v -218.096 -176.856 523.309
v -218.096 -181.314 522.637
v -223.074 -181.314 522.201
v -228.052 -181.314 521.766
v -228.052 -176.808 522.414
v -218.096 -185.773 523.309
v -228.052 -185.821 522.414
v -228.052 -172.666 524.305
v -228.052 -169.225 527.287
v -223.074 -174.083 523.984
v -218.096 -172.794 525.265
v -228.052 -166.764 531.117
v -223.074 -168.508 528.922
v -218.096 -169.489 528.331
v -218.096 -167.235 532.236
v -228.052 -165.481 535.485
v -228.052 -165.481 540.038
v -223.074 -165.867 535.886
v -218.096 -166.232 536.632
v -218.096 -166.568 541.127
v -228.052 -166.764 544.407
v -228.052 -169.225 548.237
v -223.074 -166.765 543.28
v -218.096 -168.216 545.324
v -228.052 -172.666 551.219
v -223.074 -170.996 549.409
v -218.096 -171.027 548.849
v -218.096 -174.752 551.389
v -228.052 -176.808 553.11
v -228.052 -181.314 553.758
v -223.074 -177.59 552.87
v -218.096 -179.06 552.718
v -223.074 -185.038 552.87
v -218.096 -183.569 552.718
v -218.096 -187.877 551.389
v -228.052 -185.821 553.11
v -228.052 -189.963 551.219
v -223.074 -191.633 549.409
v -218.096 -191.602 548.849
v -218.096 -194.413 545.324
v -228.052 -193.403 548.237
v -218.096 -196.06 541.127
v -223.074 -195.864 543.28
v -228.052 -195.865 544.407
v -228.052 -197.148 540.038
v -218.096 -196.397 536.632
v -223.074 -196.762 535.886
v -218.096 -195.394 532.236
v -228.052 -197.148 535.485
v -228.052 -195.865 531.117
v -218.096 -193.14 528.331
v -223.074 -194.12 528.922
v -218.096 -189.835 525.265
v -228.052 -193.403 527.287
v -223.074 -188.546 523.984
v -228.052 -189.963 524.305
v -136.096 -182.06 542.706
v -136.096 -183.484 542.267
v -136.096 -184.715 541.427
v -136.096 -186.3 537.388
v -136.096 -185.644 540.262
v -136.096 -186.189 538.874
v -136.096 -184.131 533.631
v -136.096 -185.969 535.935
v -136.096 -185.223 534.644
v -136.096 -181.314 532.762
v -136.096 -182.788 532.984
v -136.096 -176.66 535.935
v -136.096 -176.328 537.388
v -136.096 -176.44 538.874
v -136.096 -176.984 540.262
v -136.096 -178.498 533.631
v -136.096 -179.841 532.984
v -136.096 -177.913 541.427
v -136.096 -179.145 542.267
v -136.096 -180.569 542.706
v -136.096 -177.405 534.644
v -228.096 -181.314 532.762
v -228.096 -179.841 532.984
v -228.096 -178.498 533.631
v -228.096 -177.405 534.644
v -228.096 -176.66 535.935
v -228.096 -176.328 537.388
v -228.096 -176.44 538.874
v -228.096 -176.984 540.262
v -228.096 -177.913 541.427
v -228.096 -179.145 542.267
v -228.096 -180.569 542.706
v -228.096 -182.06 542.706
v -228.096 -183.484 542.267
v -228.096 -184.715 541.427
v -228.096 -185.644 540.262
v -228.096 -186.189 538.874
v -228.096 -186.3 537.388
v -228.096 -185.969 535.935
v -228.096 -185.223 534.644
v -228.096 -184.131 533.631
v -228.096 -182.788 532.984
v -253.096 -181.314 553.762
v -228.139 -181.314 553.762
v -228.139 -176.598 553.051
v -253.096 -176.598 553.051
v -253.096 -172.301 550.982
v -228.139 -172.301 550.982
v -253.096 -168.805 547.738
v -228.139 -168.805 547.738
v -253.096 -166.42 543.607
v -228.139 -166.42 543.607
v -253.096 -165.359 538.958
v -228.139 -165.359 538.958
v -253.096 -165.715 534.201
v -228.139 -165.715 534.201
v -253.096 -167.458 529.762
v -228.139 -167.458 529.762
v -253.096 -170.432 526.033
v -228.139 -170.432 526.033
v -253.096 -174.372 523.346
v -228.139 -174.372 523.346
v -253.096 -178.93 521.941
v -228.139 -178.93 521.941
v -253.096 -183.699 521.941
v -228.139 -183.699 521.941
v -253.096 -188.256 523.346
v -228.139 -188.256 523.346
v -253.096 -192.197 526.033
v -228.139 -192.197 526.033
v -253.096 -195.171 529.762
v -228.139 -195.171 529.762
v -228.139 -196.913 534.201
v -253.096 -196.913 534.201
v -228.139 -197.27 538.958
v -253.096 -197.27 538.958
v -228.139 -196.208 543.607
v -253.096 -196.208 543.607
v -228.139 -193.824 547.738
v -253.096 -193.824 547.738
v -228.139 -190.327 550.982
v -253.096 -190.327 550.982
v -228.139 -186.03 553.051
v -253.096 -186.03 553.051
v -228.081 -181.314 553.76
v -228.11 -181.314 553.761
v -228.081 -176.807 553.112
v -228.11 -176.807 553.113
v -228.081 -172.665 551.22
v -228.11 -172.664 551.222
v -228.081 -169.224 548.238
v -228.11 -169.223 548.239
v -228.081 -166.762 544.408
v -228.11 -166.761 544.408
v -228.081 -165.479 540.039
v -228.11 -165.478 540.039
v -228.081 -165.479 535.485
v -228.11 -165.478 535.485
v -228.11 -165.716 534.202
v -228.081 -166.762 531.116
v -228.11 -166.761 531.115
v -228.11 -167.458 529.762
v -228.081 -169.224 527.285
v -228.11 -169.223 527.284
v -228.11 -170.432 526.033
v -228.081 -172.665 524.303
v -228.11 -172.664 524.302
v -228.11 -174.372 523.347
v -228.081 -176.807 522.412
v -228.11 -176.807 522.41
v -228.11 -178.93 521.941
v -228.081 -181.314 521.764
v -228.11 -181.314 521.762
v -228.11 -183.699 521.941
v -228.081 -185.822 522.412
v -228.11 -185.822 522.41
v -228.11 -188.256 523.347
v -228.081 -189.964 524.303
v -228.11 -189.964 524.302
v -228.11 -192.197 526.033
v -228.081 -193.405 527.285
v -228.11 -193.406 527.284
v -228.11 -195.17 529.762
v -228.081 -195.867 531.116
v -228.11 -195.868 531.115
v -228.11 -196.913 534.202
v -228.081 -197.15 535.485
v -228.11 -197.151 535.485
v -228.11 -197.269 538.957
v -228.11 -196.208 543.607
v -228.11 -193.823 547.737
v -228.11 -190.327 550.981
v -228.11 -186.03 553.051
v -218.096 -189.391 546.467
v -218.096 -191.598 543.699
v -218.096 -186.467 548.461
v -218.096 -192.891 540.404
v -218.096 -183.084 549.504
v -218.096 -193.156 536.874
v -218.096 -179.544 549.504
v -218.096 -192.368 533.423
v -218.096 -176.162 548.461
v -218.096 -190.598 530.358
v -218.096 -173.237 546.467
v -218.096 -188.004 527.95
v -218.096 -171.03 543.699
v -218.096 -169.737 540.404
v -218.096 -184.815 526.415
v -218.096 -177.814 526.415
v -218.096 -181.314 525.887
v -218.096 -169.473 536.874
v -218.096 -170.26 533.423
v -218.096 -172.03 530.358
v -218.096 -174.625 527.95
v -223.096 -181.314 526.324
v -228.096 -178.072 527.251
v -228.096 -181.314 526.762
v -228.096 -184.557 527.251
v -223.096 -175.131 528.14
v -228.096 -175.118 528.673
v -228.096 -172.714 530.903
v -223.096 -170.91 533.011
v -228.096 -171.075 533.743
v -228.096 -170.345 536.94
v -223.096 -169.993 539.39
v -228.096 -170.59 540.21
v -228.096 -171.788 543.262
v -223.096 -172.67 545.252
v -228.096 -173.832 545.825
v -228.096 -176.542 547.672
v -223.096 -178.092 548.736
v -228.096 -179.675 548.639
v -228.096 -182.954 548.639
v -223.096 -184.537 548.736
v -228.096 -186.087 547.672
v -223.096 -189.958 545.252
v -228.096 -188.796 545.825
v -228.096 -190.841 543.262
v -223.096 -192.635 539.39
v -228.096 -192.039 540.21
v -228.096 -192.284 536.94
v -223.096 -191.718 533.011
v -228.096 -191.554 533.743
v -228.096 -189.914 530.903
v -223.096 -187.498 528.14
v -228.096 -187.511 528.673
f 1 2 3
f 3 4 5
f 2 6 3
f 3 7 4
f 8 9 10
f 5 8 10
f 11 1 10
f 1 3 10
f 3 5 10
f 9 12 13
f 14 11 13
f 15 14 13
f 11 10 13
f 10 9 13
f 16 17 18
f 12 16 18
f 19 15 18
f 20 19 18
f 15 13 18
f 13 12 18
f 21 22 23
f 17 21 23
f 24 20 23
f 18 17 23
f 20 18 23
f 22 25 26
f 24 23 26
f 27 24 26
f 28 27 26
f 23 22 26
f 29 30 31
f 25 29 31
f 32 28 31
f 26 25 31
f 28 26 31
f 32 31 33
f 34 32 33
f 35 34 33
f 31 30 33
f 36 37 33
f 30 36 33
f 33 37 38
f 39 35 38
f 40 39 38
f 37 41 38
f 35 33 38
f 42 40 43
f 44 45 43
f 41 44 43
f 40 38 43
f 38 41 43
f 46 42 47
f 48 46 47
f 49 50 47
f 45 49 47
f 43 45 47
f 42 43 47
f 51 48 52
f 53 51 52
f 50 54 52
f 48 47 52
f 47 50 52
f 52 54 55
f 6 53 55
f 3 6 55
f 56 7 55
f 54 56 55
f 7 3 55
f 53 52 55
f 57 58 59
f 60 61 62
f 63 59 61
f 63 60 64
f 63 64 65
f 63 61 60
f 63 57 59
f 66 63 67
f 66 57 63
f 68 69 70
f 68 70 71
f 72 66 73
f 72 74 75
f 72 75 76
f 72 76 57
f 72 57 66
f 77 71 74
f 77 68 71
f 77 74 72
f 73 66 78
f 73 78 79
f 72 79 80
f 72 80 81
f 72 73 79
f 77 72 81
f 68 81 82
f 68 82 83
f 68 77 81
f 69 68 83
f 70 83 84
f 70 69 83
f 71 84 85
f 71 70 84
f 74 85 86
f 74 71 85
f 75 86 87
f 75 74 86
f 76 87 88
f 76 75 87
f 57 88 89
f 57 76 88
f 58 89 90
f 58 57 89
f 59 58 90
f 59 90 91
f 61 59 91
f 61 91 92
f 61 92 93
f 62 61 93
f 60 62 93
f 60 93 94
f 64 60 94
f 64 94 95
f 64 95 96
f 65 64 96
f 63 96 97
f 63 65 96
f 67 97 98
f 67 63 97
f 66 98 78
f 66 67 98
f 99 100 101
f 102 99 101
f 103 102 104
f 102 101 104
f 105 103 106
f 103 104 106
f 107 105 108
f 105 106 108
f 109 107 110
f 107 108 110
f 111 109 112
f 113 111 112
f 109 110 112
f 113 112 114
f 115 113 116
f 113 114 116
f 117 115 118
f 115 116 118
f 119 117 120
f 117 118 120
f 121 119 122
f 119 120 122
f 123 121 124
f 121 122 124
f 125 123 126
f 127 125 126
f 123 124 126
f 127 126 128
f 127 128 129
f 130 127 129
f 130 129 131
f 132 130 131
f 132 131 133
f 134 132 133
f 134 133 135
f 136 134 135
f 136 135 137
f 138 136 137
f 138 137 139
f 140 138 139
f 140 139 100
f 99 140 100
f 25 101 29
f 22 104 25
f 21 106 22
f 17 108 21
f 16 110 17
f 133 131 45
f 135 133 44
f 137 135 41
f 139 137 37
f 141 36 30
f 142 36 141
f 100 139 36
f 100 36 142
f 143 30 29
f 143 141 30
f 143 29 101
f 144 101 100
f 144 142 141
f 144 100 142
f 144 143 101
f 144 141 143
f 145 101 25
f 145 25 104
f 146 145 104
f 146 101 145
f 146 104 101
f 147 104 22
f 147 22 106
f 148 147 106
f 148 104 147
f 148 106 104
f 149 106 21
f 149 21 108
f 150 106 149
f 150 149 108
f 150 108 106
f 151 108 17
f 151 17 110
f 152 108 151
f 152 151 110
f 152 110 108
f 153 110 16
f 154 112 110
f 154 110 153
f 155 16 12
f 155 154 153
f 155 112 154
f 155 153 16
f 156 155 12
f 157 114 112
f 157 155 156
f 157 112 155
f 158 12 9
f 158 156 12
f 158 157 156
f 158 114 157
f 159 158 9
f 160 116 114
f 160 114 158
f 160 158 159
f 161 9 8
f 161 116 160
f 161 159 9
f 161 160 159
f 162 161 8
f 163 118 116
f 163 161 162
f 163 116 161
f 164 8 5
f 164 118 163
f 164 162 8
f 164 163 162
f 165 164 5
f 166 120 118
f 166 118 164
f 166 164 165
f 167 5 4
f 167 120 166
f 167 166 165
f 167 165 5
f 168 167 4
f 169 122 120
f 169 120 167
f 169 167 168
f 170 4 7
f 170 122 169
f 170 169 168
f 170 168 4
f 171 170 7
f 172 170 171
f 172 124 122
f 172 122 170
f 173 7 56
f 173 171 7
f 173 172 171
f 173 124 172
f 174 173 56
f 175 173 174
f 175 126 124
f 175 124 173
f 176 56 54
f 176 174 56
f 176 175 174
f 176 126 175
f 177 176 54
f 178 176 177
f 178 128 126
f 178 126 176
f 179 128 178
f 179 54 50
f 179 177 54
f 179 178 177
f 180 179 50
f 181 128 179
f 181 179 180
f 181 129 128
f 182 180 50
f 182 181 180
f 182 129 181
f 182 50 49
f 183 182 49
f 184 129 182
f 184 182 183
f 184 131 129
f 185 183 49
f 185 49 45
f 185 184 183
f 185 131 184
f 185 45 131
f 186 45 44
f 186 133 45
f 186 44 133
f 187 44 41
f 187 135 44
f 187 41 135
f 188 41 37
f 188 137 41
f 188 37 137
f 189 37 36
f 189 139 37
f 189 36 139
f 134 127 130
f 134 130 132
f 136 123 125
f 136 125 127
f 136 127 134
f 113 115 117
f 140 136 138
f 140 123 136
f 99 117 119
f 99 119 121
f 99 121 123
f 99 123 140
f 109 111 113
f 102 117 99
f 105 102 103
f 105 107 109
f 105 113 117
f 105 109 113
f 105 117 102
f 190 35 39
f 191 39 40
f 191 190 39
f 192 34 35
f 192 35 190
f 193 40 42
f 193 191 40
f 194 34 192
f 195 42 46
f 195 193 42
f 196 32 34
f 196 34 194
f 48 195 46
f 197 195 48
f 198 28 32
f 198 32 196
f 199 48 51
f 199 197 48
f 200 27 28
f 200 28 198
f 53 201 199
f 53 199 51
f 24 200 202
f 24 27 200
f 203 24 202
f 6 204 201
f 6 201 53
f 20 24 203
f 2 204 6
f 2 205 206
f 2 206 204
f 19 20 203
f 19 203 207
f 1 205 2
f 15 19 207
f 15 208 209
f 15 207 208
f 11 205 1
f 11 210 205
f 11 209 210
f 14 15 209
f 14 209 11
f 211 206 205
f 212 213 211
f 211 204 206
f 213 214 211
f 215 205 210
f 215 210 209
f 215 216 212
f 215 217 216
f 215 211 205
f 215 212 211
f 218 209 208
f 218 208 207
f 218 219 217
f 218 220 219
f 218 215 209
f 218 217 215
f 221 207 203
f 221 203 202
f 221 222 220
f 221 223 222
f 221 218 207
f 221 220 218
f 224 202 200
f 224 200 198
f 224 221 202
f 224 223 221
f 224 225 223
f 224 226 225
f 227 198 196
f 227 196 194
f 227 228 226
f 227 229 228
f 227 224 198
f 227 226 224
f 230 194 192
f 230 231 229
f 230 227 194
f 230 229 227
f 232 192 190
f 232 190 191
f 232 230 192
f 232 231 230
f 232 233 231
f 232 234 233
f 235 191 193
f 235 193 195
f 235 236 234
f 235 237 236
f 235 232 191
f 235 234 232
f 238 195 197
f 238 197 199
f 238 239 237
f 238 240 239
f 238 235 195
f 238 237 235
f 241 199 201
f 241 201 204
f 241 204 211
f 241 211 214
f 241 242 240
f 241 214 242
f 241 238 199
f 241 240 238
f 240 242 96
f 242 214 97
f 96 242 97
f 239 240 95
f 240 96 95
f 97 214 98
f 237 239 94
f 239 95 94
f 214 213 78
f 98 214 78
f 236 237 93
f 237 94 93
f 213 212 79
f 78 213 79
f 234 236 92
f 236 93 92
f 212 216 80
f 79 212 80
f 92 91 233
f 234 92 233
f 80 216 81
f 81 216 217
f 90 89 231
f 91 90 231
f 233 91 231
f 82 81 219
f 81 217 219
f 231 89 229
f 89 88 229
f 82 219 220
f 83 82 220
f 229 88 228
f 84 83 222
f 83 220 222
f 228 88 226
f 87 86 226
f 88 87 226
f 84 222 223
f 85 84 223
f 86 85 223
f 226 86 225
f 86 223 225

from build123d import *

# Parameters (mm, degrees)
SKETCH_2_R      = 5
EXTRUDE_1_DEPTH = 92
SKETCH_3_R      = 16
EXTRUDE_2_DEPTH = 25
SKETCH_4_R      = 16
SKETCH_4_R_2    = 11
EXTRUDE_3_DEPTH = 10
EXTRUDE_3_DRAFT = 5
FILLET_1_R      = 1


with BuildPart() as part:
    # 草图2 → 凸台-拉伸1 (new body)
    with BuildSketch(Plane(origin=(-136.095806698, 0, 0), x_dir=(0, 0, -1), z_dir=(1, 0, 0))):
        with Locations((-537.761833513, -181.314321461)):
            Circle(SKETCH_2_R)
    extrude(amount=-EXTRUDE_1_DEPTH)

    # 草图3 → 凸台-拉伸2 (add)
    with BuildSketch(Plane.ZY.offset(228.095806698)):
        with Locations((537.761833513, -181.314321461)):
            Circle(SKETCH_3_R)
    extrude(amount=EXTRUDE_2_DEPTH)


with BuildPart() as extrude_3_tool:
    # 草图4 → 凸台-拉伸3 (with draft: the straight prism first)
    with BuildSketch(Plane(origin=(-228.095806698, 0, 0), x_dir=(0, 0, -1), z_dir=(1, 0, 0))):
        with Locations((-537.761833513, -181.314321461)):
            Circle(SKETCH_4_R)
        with Locations((-537.761833513, -181.314321461)):
            Circle(SKETCH_4_R_2, mode=Mode.SUBTRACT)
    extrude(amount=EXTRUDE_3_DEPTH)
    # 凸台-拉伸3: the draft: its side faces are tilted about the plane it starts from
    extrude_3_sides = [extrude_3_tool.faces().sort_by_distance(p)[0] for p in [
        (-223.095806698, -181.314321461, 553.761833513),
        (-223.095806698, -181.314321461, 548.761833513),
    ]]
    draft(extrude_3_sides, Plane(origin=(-228.095806698, 0, 0), x_dir=(0, 0, -1), z_dir=(1, 0, 0)), EXTRUDE_3_DRAFT)


with BuildPart() as part_1:
    add(part.part)

    # 凸台-拉伸3: add extrude_3_tool
    add(extrude_3_tool.part)

    # 圆角1
    # the kernel refuses this fillet: 1 mm, written as the material it takes off along each edge
    with BuildSketch(Plane(origin=(-228.095806698, -181.314321461, 537.761833513), x_dir=(0, 0, 1), z_dir=(0, -1, 0))) as fillet_1_piece_1:
        with BuildLine():
            CenterArc((16 - FILLET_1_R, FILLET_1_R * 0.0436609429085), FILLET_1_R, 355, 5)
            Line((16 - FILLET_1_R * 0.0038053019083, -FILLET_1_R * 0.0434947998392), (16, 0))
            Line((16, 0), (16, FILLET_1_R * 0.0436609429085))
        make_face()
    revolve(axis=Axis((-228.095806698, -181.314321461, 537.761833513), (-1, 0, 0)), revolution_arc=180, mode=Mode.SUBTRACT)
    with BuildSketch(Plane(origin=(-228.095806698, -181.314321461, 537.761833513), x_dir=(0, 0, -1), z_dir=(0, 1, 0))) as fillet_1_piece_2:
        with BuildLine():
            CenterArc((16 - FILLET_1_R, FILLET_1_R * 0.0436609429085), FILLET_1_R, 355, 5)
            Line((16 - FILLET_1_R * 0.0038053019083, -FILLET_1_R * 0.0434947998392), (16, 0))
            Line((16, 0), (16, FILLET_1_R * 0.0436609429085))
        make_face()
    revolve(axis=Axis((-228.095806698, -181.314321461, 537.761833513), (-1, 0, 0)), revolution_arc=180, mode=Mode.SUBTRACT)


solid = part_1.part
